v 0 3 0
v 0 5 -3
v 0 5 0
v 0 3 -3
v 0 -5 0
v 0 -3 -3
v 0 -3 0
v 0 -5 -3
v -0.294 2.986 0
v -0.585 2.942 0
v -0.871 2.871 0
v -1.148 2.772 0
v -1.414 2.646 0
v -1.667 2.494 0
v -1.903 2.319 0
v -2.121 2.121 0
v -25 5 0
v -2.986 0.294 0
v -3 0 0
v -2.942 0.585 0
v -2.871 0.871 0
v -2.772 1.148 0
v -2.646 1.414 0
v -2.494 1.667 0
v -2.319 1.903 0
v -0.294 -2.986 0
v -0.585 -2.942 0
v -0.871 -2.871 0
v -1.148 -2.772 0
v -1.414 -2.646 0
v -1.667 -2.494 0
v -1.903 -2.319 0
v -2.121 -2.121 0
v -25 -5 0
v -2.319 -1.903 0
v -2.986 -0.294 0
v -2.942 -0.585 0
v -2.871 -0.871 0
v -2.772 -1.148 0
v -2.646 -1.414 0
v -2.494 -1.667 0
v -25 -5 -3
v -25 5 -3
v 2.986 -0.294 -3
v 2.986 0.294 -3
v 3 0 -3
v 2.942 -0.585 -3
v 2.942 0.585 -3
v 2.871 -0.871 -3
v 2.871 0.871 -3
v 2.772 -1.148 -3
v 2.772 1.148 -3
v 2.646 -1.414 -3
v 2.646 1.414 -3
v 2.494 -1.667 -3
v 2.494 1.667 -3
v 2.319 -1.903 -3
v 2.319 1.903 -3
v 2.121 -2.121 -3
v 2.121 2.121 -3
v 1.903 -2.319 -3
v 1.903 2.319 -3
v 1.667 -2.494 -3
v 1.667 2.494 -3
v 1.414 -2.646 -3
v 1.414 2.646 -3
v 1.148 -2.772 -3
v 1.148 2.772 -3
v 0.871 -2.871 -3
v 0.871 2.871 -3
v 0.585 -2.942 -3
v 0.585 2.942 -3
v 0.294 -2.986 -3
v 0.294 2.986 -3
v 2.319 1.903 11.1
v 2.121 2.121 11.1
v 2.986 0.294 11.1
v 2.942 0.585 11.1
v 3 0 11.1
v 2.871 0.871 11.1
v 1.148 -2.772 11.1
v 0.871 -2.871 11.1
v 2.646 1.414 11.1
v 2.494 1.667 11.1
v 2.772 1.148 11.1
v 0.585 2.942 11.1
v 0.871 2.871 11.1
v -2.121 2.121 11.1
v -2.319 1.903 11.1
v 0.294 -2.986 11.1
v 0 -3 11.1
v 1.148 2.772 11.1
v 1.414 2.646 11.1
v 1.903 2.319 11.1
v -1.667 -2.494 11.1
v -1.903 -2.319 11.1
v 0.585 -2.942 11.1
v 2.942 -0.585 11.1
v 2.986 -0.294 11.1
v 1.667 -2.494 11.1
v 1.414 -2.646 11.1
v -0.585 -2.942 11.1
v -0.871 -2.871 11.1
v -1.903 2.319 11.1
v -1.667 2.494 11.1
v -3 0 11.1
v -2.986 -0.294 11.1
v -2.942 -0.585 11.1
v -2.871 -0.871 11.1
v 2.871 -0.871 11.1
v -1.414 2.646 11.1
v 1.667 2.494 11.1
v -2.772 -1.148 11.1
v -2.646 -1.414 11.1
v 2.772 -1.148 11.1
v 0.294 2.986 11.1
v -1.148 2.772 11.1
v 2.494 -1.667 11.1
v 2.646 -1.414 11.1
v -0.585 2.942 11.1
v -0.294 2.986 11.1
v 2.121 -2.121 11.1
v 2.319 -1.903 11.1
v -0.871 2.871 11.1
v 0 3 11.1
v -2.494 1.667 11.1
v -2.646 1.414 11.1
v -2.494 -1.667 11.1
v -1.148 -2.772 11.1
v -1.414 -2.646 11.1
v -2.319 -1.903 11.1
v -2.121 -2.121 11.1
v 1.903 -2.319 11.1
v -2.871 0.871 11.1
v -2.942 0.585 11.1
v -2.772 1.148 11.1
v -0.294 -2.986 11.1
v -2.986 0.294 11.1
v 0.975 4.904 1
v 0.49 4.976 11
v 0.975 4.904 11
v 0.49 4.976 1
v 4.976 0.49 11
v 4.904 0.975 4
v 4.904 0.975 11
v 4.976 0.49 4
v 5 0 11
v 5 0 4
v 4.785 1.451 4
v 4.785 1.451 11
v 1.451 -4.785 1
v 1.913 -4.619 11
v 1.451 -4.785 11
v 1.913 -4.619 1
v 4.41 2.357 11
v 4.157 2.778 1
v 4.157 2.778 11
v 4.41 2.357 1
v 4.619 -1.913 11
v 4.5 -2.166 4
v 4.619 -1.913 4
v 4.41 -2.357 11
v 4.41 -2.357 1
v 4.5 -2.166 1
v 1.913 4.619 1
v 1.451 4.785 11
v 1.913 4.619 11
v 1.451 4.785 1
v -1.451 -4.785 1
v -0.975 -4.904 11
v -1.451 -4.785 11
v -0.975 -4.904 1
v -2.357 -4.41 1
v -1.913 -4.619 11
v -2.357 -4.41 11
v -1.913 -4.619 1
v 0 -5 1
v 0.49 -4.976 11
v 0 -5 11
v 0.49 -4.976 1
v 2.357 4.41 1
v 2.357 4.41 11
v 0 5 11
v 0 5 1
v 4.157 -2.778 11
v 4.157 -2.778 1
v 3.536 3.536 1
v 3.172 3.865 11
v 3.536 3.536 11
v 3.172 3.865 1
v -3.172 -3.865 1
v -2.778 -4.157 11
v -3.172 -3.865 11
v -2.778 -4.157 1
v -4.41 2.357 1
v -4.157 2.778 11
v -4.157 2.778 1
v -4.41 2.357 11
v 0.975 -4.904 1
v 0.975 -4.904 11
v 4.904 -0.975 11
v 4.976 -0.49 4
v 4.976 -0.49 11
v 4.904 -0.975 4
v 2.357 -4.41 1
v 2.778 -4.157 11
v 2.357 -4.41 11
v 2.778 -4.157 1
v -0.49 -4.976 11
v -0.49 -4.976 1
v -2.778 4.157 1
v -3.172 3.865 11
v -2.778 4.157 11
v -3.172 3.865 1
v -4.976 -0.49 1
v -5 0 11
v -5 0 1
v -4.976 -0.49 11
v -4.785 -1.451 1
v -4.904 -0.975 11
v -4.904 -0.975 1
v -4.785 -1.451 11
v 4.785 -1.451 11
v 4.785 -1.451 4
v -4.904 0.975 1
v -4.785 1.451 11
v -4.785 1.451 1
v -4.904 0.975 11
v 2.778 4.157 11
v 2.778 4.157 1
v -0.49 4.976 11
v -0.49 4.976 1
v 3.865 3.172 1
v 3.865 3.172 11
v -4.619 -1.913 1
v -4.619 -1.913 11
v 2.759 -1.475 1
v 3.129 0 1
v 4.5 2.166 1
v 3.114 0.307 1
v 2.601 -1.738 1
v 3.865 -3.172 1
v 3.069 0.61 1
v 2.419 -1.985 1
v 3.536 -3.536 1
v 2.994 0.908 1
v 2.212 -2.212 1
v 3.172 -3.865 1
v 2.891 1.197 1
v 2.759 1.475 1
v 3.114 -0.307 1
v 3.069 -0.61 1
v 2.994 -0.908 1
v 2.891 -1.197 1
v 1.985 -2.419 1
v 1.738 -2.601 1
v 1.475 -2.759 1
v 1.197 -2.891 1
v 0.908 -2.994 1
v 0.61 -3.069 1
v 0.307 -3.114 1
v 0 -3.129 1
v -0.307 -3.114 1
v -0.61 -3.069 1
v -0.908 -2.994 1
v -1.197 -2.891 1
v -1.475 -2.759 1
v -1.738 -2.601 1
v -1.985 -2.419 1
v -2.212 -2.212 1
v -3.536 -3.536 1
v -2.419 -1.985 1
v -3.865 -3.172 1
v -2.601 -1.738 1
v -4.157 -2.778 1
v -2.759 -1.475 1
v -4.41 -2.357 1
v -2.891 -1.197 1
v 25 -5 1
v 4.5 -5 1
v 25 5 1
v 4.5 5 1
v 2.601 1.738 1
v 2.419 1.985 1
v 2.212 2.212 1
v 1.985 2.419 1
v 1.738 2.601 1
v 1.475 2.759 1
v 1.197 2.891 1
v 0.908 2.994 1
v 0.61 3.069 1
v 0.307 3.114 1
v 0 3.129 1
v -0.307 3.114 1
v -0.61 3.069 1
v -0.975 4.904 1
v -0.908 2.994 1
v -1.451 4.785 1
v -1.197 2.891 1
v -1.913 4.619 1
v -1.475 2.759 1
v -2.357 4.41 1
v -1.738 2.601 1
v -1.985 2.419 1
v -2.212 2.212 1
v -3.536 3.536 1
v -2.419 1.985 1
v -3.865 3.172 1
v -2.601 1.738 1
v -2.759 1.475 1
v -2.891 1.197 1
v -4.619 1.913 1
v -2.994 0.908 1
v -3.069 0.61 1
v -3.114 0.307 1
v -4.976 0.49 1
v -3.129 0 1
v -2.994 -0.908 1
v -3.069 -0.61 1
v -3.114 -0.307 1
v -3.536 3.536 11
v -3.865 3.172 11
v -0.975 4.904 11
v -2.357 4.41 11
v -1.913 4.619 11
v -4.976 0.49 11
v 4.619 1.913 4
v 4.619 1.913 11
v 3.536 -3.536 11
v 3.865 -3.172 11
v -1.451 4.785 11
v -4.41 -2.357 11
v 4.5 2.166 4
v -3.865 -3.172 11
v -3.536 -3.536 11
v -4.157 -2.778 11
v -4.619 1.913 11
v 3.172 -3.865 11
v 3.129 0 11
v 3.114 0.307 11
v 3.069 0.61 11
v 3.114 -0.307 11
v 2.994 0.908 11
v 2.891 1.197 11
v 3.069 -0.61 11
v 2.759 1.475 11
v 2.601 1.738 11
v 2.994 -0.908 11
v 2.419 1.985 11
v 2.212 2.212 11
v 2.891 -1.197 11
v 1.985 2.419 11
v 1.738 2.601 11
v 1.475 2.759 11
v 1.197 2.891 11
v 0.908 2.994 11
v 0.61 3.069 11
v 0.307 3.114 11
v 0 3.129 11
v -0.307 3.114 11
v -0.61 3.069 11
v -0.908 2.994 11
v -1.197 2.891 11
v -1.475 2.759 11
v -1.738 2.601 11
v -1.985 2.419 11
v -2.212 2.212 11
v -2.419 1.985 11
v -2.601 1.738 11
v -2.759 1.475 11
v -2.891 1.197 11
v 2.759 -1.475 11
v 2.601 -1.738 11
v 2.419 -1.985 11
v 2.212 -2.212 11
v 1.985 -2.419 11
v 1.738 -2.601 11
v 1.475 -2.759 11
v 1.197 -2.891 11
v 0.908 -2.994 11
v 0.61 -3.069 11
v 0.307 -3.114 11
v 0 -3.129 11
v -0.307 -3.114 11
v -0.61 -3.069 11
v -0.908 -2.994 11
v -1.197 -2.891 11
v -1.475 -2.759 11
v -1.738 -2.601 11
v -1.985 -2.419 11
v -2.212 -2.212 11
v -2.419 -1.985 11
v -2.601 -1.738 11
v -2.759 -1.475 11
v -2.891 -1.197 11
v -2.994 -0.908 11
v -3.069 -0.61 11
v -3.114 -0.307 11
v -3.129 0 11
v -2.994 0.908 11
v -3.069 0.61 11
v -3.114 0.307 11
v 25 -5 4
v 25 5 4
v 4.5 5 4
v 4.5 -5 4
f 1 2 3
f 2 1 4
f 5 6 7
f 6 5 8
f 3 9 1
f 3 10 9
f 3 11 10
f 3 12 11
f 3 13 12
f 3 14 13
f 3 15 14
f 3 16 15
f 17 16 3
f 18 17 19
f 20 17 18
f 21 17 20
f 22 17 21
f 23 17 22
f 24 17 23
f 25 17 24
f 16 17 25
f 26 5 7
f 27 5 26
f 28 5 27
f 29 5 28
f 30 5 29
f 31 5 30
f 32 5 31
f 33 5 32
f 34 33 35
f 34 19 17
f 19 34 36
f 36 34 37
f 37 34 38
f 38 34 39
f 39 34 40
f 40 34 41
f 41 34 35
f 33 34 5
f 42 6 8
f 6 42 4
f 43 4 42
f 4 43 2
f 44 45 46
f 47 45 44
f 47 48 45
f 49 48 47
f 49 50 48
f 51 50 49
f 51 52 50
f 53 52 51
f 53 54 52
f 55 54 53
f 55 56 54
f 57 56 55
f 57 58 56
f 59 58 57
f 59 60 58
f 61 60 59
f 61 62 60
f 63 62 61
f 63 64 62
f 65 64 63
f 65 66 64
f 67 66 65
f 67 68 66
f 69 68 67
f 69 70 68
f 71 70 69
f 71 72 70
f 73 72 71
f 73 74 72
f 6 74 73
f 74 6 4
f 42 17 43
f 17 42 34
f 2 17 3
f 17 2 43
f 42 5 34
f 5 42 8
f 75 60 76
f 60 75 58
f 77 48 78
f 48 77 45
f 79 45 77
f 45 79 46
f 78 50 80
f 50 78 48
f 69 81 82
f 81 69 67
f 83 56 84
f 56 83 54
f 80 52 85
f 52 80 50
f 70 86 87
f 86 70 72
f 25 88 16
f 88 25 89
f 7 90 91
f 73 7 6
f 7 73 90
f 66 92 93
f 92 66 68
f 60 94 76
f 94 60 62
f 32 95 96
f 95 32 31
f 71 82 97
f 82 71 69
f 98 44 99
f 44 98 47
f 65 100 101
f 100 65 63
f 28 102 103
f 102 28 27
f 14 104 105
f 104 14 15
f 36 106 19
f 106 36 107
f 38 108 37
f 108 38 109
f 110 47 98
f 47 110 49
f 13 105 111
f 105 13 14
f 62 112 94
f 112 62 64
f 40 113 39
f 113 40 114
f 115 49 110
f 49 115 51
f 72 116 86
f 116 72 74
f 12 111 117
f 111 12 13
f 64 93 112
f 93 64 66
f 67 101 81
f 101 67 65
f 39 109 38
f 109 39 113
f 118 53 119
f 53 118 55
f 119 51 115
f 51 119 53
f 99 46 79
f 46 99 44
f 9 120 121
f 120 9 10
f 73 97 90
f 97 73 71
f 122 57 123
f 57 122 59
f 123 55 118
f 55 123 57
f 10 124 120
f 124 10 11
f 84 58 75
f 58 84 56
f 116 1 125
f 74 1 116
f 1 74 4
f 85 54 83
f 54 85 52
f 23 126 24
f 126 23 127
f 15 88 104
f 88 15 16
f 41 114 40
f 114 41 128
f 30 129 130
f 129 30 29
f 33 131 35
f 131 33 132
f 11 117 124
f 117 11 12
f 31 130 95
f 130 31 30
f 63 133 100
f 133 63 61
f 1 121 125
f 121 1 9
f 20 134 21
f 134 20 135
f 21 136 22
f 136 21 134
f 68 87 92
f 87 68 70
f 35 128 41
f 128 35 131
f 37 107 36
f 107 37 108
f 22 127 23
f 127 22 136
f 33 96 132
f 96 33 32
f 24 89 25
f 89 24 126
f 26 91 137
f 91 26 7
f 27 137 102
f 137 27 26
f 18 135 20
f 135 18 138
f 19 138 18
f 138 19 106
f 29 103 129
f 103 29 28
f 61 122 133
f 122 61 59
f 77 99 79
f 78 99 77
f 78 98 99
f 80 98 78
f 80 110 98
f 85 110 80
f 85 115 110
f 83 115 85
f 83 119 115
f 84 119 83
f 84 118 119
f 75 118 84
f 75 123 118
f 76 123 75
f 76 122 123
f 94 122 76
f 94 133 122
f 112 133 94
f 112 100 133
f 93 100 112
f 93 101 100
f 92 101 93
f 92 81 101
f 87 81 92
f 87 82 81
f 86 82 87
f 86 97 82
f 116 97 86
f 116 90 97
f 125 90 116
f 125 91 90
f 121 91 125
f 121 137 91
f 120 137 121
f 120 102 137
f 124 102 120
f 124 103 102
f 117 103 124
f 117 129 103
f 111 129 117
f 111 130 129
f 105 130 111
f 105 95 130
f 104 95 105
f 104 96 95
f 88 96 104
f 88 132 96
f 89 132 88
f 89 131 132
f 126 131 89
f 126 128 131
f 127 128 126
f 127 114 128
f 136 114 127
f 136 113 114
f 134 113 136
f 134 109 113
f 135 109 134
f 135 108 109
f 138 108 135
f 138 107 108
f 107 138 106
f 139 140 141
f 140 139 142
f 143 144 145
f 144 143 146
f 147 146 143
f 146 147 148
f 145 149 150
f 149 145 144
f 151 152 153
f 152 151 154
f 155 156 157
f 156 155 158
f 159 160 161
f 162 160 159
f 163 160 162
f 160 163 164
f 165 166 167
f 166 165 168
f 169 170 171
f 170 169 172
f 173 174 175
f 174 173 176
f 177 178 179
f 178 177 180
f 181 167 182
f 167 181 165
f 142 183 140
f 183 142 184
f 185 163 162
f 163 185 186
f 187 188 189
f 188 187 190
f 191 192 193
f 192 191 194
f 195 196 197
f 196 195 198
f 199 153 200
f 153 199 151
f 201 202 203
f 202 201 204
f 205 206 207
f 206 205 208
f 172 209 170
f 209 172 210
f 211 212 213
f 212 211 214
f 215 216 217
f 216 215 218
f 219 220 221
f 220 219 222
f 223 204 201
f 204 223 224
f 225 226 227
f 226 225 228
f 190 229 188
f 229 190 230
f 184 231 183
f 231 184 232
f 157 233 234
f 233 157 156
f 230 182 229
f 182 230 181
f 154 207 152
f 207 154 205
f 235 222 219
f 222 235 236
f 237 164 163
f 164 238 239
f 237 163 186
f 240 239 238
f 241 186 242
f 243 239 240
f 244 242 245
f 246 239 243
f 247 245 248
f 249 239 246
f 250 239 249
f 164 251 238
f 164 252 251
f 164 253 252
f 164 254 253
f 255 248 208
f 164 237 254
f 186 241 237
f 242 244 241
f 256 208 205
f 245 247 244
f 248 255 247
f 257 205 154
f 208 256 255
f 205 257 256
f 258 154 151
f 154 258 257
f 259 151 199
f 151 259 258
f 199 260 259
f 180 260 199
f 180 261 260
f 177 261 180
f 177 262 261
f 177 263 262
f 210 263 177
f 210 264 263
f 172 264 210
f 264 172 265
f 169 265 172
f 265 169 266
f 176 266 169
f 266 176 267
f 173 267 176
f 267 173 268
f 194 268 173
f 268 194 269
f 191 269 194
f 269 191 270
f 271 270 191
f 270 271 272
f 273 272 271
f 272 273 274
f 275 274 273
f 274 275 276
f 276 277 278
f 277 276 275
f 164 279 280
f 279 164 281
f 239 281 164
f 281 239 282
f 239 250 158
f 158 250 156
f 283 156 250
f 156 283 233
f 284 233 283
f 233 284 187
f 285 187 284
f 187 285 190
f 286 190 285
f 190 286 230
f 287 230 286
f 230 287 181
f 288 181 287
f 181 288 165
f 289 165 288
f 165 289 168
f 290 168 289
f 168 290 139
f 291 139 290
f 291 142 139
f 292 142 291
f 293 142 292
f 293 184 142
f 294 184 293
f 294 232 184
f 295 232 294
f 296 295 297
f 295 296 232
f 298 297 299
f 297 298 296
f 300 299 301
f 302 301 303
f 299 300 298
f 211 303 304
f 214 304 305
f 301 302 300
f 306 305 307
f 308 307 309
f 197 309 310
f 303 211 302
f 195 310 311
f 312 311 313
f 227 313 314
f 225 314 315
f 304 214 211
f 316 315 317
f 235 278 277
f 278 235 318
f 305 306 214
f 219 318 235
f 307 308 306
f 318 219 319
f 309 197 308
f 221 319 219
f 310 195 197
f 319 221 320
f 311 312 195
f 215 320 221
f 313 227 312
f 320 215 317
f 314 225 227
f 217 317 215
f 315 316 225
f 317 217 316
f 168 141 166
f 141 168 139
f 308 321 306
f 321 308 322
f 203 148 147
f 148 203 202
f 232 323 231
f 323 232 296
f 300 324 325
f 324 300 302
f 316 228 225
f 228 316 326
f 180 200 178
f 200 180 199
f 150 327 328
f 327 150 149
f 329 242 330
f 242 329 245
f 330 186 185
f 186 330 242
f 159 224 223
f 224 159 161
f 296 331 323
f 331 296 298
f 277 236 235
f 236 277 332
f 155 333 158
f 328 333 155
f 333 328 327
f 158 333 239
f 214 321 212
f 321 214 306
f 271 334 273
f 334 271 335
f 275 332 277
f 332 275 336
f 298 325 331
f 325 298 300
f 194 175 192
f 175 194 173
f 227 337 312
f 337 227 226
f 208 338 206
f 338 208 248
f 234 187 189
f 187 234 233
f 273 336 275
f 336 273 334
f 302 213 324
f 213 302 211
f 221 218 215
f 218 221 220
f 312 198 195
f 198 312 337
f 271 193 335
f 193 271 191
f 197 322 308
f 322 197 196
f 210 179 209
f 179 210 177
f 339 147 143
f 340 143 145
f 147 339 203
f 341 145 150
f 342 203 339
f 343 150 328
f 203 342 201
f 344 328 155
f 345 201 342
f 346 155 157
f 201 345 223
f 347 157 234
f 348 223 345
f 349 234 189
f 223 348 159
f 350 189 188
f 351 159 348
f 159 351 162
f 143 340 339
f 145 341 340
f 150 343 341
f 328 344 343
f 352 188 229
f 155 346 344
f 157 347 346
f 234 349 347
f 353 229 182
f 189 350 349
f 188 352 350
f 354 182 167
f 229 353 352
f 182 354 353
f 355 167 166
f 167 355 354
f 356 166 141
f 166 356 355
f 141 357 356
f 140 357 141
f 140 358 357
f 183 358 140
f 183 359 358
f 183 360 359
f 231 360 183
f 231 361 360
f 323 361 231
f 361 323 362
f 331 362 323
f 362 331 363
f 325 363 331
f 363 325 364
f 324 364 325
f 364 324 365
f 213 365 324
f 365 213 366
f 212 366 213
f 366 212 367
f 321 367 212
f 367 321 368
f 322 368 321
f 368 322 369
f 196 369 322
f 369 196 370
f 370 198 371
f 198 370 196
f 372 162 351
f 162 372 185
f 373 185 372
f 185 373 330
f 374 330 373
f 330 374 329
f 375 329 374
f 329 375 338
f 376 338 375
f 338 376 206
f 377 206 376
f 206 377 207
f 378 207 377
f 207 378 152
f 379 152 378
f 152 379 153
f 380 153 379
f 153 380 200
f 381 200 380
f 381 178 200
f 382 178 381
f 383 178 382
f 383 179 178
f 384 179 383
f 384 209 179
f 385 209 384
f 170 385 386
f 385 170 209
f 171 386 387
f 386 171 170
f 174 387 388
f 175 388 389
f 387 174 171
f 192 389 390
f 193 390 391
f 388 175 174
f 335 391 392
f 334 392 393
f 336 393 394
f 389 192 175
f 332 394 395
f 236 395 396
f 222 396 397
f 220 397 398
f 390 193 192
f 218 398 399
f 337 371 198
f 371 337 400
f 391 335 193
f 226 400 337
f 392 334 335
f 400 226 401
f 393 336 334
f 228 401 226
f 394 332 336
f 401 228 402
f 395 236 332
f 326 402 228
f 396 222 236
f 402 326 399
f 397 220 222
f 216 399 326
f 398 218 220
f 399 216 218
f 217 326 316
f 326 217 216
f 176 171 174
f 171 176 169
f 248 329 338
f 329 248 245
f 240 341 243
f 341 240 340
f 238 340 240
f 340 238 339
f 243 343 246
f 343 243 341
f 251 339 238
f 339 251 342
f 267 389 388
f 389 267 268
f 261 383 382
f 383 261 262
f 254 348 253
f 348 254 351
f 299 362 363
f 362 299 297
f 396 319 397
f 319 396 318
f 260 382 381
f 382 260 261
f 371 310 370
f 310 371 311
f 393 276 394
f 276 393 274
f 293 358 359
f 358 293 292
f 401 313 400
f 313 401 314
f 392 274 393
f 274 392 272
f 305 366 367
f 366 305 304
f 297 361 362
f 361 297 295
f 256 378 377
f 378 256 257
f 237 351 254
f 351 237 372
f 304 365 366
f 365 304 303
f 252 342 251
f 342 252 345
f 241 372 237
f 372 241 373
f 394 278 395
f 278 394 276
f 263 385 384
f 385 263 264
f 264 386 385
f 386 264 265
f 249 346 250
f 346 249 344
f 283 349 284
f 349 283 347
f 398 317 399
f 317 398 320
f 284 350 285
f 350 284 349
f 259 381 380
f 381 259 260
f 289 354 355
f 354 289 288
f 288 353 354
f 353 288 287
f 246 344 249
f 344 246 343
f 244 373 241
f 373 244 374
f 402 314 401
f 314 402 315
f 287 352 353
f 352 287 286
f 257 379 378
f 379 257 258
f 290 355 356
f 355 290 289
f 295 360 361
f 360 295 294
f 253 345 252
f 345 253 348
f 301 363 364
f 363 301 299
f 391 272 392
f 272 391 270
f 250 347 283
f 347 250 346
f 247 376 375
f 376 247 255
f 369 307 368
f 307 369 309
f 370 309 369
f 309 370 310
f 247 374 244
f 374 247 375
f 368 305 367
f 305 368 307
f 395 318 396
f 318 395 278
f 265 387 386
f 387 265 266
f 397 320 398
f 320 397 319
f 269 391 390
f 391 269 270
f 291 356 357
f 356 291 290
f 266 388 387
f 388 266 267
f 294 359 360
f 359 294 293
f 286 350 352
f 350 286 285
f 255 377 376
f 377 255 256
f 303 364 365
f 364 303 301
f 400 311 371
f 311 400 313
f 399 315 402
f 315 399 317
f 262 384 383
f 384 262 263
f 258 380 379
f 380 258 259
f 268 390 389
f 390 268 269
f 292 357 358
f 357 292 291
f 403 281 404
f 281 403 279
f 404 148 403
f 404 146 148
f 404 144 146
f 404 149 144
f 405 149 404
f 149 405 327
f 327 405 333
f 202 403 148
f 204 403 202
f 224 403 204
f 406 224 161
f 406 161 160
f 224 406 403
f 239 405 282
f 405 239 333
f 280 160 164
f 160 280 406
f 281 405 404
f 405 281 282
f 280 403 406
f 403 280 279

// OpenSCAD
// Reference submission for hinge-90-tight.
// Same topology as the loose variant; the bore inscribed diameter is 6.25 mm,
// giving a 0.25 mm as-designed diametral clearance inside the 0.20-0.30 band.
// Units: mm. Assembly axis: +Z through the origin.
agentscad_part = "all";
hinge_angle = 0;   // pose control: the benchmark re-renders the moving part at this angle
$fn = 64;

bore_d = 6.25 / cos(180 / $fn);

module fixed_leaf() {
  union() {
    translate([-25, -5, -3]) cube([25, 10, 3]);
    translate([0, 0, -3]) cylinder(h = 14.1, d = 6);
  }
}

module moving_leaf() {
  union() {
    difference() {
      translate([0, 0, 1]) cylinder(h = 10, d = 10);
      translate([0, 0, 0.9]) cylinder(h = 10.2, d = bore_d);
    }
    translate([4.5, -5, 1]) cube([20.5, 10, 3]);
  }
}

module generated_part() {
  if (agentscad_part == "all" || agentscad_part == "fixed") fixed_leaf();
  if (agentscad_part == "all" || agentscad_part == "moving") rotate([0, 0, hinge_angle]) moving_leaf();
}

generated_part();
